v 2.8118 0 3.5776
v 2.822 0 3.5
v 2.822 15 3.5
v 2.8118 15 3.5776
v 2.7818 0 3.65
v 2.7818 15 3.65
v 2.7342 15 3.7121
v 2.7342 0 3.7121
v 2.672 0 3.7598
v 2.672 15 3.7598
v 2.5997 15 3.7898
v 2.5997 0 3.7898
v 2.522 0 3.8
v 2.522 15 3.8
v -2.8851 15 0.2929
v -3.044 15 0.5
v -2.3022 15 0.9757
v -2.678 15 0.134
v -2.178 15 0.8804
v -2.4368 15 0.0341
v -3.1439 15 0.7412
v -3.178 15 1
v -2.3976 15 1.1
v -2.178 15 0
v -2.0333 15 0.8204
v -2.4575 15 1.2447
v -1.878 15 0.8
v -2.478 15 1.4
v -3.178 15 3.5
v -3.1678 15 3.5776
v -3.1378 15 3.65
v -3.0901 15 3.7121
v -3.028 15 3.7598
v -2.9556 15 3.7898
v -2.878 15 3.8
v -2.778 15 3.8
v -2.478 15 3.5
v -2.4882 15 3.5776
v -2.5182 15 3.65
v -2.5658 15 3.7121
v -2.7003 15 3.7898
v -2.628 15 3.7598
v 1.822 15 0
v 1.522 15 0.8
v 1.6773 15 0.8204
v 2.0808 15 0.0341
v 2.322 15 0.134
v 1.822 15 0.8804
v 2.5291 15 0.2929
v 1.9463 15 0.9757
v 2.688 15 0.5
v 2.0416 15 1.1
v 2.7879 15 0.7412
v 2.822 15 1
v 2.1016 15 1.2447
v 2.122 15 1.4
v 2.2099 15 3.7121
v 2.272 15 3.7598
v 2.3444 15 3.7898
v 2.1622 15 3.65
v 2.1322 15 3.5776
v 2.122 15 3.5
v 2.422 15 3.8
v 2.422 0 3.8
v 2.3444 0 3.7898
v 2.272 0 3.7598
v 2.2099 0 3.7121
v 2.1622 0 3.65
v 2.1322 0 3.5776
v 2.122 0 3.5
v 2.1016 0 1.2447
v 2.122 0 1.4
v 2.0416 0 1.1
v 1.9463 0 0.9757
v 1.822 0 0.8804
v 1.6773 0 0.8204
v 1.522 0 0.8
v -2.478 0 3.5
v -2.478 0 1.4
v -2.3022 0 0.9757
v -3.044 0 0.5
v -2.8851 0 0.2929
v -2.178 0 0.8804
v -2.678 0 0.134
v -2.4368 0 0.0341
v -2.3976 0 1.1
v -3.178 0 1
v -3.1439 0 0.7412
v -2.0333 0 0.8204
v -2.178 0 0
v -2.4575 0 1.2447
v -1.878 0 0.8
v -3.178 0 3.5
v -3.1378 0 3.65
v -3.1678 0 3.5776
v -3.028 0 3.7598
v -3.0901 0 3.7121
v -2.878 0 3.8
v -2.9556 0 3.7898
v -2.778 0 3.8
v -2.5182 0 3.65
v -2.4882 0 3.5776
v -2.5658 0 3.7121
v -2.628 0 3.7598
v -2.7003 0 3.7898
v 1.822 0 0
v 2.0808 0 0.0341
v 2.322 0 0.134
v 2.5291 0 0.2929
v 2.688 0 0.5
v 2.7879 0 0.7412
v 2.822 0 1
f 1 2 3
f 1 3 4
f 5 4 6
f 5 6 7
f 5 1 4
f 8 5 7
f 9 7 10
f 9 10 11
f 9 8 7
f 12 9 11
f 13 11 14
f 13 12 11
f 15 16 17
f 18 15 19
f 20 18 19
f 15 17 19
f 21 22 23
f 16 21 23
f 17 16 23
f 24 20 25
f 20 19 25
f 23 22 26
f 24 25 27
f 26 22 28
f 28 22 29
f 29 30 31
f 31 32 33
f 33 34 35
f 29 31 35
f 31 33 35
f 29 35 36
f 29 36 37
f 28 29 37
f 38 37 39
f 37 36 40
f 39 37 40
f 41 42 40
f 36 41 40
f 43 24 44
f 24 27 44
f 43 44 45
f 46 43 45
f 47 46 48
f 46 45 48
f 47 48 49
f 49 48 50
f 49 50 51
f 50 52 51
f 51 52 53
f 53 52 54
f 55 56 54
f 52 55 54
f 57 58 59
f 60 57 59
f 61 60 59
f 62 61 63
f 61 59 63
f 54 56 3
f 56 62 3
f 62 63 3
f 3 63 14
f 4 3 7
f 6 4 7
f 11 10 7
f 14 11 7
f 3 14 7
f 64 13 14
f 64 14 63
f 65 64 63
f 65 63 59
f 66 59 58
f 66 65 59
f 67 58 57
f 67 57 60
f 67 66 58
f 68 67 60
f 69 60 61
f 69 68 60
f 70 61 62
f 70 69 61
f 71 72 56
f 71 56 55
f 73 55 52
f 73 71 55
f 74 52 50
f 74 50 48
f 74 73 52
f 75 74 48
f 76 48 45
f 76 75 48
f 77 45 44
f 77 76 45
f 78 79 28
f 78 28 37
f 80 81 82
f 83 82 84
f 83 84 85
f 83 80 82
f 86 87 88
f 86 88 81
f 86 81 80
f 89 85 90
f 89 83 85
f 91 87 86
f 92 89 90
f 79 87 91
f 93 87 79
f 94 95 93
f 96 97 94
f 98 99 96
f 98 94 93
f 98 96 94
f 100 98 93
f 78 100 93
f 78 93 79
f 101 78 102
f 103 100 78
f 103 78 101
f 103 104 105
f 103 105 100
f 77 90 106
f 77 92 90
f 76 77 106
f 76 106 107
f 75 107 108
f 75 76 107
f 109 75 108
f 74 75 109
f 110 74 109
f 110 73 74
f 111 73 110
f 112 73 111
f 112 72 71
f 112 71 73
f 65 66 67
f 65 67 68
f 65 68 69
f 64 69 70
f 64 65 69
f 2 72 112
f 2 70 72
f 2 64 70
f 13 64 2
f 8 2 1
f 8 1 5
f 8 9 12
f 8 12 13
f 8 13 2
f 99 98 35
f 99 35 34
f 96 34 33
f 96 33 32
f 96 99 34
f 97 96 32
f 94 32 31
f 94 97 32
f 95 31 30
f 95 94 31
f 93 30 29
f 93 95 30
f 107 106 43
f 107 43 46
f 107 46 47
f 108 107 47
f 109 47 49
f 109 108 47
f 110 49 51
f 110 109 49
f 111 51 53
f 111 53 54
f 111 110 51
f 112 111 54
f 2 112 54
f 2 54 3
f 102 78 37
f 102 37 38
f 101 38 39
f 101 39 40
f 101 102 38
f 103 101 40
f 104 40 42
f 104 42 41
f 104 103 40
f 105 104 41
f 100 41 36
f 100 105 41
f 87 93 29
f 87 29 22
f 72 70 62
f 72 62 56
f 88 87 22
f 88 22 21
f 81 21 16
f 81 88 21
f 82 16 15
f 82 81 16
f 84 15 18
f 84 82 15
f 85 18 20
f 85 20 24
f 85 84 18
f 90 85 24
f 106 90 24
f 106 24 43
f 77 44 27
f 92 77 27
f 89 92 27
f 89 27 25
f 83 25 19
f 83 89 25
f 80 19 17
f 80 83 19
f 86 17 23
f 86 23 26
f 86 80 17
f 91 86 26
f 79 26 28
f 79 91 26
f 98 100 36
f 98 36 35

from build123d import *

# Parameters (mm, degrees)
F1_DEPTH = 15


with BuildPart() as f1:
    # F0 (on Front) → F1 (new body)
    with BuildSketch(Plane.XZ):
        with BuildLine():
            Line((-2.777976, 3.8), (-2.877976, 3.8))
            ThreePointArc((-2.877976, 3.8), (-3.090108, 3.712132), (-3.177976, 3.5))
            Line((-3.177976, 3.5), (-3.177976, 1))
            ThreePointArc((-3.177976, 1), (-2.885083, 0.292893), (-2.177976, 0))
            Line((-2.177976, 0), (1.822024, 0))
            ThreePointArc((1.822024, 0), (2.52913, 0.292893), (2.822024, 1))
            Line((2.822024, 1), (2.822024, 3.5))
            ThreePointArc((2.822024, 3.5), (2.734156, 3.712132), (2.522024, 3.8))
            Line((2.522024, 3.8), (2.422024, 3.8))
            ThreePointArc((2.422024, 3.8), (2.209892, 3.712132), (2.122024, 3.5))
            Line((2.122024, 3.5), (2.122024, 1.4))
            ThreePointArc((2.122024, 1.4), (1.946288, 0.975736), (1.522024, 0.8))
            Line((1.522024, 0.8), (-1.877976, 0.8))
            ThreePointArc((-1.877976, 0.8), (-2.30224, 0.975736), (-2.477976, 1.4))
            Line((-2.477976, 1.4), (-2.477976, 3.5))
            ThreePointArc((-2.477976, 3.5), (-2.565844, 3.712132), (-2.777976, 3.8))
        make_face()
    extrude(amount=-F1_DEPTH)


solid = f1.part
